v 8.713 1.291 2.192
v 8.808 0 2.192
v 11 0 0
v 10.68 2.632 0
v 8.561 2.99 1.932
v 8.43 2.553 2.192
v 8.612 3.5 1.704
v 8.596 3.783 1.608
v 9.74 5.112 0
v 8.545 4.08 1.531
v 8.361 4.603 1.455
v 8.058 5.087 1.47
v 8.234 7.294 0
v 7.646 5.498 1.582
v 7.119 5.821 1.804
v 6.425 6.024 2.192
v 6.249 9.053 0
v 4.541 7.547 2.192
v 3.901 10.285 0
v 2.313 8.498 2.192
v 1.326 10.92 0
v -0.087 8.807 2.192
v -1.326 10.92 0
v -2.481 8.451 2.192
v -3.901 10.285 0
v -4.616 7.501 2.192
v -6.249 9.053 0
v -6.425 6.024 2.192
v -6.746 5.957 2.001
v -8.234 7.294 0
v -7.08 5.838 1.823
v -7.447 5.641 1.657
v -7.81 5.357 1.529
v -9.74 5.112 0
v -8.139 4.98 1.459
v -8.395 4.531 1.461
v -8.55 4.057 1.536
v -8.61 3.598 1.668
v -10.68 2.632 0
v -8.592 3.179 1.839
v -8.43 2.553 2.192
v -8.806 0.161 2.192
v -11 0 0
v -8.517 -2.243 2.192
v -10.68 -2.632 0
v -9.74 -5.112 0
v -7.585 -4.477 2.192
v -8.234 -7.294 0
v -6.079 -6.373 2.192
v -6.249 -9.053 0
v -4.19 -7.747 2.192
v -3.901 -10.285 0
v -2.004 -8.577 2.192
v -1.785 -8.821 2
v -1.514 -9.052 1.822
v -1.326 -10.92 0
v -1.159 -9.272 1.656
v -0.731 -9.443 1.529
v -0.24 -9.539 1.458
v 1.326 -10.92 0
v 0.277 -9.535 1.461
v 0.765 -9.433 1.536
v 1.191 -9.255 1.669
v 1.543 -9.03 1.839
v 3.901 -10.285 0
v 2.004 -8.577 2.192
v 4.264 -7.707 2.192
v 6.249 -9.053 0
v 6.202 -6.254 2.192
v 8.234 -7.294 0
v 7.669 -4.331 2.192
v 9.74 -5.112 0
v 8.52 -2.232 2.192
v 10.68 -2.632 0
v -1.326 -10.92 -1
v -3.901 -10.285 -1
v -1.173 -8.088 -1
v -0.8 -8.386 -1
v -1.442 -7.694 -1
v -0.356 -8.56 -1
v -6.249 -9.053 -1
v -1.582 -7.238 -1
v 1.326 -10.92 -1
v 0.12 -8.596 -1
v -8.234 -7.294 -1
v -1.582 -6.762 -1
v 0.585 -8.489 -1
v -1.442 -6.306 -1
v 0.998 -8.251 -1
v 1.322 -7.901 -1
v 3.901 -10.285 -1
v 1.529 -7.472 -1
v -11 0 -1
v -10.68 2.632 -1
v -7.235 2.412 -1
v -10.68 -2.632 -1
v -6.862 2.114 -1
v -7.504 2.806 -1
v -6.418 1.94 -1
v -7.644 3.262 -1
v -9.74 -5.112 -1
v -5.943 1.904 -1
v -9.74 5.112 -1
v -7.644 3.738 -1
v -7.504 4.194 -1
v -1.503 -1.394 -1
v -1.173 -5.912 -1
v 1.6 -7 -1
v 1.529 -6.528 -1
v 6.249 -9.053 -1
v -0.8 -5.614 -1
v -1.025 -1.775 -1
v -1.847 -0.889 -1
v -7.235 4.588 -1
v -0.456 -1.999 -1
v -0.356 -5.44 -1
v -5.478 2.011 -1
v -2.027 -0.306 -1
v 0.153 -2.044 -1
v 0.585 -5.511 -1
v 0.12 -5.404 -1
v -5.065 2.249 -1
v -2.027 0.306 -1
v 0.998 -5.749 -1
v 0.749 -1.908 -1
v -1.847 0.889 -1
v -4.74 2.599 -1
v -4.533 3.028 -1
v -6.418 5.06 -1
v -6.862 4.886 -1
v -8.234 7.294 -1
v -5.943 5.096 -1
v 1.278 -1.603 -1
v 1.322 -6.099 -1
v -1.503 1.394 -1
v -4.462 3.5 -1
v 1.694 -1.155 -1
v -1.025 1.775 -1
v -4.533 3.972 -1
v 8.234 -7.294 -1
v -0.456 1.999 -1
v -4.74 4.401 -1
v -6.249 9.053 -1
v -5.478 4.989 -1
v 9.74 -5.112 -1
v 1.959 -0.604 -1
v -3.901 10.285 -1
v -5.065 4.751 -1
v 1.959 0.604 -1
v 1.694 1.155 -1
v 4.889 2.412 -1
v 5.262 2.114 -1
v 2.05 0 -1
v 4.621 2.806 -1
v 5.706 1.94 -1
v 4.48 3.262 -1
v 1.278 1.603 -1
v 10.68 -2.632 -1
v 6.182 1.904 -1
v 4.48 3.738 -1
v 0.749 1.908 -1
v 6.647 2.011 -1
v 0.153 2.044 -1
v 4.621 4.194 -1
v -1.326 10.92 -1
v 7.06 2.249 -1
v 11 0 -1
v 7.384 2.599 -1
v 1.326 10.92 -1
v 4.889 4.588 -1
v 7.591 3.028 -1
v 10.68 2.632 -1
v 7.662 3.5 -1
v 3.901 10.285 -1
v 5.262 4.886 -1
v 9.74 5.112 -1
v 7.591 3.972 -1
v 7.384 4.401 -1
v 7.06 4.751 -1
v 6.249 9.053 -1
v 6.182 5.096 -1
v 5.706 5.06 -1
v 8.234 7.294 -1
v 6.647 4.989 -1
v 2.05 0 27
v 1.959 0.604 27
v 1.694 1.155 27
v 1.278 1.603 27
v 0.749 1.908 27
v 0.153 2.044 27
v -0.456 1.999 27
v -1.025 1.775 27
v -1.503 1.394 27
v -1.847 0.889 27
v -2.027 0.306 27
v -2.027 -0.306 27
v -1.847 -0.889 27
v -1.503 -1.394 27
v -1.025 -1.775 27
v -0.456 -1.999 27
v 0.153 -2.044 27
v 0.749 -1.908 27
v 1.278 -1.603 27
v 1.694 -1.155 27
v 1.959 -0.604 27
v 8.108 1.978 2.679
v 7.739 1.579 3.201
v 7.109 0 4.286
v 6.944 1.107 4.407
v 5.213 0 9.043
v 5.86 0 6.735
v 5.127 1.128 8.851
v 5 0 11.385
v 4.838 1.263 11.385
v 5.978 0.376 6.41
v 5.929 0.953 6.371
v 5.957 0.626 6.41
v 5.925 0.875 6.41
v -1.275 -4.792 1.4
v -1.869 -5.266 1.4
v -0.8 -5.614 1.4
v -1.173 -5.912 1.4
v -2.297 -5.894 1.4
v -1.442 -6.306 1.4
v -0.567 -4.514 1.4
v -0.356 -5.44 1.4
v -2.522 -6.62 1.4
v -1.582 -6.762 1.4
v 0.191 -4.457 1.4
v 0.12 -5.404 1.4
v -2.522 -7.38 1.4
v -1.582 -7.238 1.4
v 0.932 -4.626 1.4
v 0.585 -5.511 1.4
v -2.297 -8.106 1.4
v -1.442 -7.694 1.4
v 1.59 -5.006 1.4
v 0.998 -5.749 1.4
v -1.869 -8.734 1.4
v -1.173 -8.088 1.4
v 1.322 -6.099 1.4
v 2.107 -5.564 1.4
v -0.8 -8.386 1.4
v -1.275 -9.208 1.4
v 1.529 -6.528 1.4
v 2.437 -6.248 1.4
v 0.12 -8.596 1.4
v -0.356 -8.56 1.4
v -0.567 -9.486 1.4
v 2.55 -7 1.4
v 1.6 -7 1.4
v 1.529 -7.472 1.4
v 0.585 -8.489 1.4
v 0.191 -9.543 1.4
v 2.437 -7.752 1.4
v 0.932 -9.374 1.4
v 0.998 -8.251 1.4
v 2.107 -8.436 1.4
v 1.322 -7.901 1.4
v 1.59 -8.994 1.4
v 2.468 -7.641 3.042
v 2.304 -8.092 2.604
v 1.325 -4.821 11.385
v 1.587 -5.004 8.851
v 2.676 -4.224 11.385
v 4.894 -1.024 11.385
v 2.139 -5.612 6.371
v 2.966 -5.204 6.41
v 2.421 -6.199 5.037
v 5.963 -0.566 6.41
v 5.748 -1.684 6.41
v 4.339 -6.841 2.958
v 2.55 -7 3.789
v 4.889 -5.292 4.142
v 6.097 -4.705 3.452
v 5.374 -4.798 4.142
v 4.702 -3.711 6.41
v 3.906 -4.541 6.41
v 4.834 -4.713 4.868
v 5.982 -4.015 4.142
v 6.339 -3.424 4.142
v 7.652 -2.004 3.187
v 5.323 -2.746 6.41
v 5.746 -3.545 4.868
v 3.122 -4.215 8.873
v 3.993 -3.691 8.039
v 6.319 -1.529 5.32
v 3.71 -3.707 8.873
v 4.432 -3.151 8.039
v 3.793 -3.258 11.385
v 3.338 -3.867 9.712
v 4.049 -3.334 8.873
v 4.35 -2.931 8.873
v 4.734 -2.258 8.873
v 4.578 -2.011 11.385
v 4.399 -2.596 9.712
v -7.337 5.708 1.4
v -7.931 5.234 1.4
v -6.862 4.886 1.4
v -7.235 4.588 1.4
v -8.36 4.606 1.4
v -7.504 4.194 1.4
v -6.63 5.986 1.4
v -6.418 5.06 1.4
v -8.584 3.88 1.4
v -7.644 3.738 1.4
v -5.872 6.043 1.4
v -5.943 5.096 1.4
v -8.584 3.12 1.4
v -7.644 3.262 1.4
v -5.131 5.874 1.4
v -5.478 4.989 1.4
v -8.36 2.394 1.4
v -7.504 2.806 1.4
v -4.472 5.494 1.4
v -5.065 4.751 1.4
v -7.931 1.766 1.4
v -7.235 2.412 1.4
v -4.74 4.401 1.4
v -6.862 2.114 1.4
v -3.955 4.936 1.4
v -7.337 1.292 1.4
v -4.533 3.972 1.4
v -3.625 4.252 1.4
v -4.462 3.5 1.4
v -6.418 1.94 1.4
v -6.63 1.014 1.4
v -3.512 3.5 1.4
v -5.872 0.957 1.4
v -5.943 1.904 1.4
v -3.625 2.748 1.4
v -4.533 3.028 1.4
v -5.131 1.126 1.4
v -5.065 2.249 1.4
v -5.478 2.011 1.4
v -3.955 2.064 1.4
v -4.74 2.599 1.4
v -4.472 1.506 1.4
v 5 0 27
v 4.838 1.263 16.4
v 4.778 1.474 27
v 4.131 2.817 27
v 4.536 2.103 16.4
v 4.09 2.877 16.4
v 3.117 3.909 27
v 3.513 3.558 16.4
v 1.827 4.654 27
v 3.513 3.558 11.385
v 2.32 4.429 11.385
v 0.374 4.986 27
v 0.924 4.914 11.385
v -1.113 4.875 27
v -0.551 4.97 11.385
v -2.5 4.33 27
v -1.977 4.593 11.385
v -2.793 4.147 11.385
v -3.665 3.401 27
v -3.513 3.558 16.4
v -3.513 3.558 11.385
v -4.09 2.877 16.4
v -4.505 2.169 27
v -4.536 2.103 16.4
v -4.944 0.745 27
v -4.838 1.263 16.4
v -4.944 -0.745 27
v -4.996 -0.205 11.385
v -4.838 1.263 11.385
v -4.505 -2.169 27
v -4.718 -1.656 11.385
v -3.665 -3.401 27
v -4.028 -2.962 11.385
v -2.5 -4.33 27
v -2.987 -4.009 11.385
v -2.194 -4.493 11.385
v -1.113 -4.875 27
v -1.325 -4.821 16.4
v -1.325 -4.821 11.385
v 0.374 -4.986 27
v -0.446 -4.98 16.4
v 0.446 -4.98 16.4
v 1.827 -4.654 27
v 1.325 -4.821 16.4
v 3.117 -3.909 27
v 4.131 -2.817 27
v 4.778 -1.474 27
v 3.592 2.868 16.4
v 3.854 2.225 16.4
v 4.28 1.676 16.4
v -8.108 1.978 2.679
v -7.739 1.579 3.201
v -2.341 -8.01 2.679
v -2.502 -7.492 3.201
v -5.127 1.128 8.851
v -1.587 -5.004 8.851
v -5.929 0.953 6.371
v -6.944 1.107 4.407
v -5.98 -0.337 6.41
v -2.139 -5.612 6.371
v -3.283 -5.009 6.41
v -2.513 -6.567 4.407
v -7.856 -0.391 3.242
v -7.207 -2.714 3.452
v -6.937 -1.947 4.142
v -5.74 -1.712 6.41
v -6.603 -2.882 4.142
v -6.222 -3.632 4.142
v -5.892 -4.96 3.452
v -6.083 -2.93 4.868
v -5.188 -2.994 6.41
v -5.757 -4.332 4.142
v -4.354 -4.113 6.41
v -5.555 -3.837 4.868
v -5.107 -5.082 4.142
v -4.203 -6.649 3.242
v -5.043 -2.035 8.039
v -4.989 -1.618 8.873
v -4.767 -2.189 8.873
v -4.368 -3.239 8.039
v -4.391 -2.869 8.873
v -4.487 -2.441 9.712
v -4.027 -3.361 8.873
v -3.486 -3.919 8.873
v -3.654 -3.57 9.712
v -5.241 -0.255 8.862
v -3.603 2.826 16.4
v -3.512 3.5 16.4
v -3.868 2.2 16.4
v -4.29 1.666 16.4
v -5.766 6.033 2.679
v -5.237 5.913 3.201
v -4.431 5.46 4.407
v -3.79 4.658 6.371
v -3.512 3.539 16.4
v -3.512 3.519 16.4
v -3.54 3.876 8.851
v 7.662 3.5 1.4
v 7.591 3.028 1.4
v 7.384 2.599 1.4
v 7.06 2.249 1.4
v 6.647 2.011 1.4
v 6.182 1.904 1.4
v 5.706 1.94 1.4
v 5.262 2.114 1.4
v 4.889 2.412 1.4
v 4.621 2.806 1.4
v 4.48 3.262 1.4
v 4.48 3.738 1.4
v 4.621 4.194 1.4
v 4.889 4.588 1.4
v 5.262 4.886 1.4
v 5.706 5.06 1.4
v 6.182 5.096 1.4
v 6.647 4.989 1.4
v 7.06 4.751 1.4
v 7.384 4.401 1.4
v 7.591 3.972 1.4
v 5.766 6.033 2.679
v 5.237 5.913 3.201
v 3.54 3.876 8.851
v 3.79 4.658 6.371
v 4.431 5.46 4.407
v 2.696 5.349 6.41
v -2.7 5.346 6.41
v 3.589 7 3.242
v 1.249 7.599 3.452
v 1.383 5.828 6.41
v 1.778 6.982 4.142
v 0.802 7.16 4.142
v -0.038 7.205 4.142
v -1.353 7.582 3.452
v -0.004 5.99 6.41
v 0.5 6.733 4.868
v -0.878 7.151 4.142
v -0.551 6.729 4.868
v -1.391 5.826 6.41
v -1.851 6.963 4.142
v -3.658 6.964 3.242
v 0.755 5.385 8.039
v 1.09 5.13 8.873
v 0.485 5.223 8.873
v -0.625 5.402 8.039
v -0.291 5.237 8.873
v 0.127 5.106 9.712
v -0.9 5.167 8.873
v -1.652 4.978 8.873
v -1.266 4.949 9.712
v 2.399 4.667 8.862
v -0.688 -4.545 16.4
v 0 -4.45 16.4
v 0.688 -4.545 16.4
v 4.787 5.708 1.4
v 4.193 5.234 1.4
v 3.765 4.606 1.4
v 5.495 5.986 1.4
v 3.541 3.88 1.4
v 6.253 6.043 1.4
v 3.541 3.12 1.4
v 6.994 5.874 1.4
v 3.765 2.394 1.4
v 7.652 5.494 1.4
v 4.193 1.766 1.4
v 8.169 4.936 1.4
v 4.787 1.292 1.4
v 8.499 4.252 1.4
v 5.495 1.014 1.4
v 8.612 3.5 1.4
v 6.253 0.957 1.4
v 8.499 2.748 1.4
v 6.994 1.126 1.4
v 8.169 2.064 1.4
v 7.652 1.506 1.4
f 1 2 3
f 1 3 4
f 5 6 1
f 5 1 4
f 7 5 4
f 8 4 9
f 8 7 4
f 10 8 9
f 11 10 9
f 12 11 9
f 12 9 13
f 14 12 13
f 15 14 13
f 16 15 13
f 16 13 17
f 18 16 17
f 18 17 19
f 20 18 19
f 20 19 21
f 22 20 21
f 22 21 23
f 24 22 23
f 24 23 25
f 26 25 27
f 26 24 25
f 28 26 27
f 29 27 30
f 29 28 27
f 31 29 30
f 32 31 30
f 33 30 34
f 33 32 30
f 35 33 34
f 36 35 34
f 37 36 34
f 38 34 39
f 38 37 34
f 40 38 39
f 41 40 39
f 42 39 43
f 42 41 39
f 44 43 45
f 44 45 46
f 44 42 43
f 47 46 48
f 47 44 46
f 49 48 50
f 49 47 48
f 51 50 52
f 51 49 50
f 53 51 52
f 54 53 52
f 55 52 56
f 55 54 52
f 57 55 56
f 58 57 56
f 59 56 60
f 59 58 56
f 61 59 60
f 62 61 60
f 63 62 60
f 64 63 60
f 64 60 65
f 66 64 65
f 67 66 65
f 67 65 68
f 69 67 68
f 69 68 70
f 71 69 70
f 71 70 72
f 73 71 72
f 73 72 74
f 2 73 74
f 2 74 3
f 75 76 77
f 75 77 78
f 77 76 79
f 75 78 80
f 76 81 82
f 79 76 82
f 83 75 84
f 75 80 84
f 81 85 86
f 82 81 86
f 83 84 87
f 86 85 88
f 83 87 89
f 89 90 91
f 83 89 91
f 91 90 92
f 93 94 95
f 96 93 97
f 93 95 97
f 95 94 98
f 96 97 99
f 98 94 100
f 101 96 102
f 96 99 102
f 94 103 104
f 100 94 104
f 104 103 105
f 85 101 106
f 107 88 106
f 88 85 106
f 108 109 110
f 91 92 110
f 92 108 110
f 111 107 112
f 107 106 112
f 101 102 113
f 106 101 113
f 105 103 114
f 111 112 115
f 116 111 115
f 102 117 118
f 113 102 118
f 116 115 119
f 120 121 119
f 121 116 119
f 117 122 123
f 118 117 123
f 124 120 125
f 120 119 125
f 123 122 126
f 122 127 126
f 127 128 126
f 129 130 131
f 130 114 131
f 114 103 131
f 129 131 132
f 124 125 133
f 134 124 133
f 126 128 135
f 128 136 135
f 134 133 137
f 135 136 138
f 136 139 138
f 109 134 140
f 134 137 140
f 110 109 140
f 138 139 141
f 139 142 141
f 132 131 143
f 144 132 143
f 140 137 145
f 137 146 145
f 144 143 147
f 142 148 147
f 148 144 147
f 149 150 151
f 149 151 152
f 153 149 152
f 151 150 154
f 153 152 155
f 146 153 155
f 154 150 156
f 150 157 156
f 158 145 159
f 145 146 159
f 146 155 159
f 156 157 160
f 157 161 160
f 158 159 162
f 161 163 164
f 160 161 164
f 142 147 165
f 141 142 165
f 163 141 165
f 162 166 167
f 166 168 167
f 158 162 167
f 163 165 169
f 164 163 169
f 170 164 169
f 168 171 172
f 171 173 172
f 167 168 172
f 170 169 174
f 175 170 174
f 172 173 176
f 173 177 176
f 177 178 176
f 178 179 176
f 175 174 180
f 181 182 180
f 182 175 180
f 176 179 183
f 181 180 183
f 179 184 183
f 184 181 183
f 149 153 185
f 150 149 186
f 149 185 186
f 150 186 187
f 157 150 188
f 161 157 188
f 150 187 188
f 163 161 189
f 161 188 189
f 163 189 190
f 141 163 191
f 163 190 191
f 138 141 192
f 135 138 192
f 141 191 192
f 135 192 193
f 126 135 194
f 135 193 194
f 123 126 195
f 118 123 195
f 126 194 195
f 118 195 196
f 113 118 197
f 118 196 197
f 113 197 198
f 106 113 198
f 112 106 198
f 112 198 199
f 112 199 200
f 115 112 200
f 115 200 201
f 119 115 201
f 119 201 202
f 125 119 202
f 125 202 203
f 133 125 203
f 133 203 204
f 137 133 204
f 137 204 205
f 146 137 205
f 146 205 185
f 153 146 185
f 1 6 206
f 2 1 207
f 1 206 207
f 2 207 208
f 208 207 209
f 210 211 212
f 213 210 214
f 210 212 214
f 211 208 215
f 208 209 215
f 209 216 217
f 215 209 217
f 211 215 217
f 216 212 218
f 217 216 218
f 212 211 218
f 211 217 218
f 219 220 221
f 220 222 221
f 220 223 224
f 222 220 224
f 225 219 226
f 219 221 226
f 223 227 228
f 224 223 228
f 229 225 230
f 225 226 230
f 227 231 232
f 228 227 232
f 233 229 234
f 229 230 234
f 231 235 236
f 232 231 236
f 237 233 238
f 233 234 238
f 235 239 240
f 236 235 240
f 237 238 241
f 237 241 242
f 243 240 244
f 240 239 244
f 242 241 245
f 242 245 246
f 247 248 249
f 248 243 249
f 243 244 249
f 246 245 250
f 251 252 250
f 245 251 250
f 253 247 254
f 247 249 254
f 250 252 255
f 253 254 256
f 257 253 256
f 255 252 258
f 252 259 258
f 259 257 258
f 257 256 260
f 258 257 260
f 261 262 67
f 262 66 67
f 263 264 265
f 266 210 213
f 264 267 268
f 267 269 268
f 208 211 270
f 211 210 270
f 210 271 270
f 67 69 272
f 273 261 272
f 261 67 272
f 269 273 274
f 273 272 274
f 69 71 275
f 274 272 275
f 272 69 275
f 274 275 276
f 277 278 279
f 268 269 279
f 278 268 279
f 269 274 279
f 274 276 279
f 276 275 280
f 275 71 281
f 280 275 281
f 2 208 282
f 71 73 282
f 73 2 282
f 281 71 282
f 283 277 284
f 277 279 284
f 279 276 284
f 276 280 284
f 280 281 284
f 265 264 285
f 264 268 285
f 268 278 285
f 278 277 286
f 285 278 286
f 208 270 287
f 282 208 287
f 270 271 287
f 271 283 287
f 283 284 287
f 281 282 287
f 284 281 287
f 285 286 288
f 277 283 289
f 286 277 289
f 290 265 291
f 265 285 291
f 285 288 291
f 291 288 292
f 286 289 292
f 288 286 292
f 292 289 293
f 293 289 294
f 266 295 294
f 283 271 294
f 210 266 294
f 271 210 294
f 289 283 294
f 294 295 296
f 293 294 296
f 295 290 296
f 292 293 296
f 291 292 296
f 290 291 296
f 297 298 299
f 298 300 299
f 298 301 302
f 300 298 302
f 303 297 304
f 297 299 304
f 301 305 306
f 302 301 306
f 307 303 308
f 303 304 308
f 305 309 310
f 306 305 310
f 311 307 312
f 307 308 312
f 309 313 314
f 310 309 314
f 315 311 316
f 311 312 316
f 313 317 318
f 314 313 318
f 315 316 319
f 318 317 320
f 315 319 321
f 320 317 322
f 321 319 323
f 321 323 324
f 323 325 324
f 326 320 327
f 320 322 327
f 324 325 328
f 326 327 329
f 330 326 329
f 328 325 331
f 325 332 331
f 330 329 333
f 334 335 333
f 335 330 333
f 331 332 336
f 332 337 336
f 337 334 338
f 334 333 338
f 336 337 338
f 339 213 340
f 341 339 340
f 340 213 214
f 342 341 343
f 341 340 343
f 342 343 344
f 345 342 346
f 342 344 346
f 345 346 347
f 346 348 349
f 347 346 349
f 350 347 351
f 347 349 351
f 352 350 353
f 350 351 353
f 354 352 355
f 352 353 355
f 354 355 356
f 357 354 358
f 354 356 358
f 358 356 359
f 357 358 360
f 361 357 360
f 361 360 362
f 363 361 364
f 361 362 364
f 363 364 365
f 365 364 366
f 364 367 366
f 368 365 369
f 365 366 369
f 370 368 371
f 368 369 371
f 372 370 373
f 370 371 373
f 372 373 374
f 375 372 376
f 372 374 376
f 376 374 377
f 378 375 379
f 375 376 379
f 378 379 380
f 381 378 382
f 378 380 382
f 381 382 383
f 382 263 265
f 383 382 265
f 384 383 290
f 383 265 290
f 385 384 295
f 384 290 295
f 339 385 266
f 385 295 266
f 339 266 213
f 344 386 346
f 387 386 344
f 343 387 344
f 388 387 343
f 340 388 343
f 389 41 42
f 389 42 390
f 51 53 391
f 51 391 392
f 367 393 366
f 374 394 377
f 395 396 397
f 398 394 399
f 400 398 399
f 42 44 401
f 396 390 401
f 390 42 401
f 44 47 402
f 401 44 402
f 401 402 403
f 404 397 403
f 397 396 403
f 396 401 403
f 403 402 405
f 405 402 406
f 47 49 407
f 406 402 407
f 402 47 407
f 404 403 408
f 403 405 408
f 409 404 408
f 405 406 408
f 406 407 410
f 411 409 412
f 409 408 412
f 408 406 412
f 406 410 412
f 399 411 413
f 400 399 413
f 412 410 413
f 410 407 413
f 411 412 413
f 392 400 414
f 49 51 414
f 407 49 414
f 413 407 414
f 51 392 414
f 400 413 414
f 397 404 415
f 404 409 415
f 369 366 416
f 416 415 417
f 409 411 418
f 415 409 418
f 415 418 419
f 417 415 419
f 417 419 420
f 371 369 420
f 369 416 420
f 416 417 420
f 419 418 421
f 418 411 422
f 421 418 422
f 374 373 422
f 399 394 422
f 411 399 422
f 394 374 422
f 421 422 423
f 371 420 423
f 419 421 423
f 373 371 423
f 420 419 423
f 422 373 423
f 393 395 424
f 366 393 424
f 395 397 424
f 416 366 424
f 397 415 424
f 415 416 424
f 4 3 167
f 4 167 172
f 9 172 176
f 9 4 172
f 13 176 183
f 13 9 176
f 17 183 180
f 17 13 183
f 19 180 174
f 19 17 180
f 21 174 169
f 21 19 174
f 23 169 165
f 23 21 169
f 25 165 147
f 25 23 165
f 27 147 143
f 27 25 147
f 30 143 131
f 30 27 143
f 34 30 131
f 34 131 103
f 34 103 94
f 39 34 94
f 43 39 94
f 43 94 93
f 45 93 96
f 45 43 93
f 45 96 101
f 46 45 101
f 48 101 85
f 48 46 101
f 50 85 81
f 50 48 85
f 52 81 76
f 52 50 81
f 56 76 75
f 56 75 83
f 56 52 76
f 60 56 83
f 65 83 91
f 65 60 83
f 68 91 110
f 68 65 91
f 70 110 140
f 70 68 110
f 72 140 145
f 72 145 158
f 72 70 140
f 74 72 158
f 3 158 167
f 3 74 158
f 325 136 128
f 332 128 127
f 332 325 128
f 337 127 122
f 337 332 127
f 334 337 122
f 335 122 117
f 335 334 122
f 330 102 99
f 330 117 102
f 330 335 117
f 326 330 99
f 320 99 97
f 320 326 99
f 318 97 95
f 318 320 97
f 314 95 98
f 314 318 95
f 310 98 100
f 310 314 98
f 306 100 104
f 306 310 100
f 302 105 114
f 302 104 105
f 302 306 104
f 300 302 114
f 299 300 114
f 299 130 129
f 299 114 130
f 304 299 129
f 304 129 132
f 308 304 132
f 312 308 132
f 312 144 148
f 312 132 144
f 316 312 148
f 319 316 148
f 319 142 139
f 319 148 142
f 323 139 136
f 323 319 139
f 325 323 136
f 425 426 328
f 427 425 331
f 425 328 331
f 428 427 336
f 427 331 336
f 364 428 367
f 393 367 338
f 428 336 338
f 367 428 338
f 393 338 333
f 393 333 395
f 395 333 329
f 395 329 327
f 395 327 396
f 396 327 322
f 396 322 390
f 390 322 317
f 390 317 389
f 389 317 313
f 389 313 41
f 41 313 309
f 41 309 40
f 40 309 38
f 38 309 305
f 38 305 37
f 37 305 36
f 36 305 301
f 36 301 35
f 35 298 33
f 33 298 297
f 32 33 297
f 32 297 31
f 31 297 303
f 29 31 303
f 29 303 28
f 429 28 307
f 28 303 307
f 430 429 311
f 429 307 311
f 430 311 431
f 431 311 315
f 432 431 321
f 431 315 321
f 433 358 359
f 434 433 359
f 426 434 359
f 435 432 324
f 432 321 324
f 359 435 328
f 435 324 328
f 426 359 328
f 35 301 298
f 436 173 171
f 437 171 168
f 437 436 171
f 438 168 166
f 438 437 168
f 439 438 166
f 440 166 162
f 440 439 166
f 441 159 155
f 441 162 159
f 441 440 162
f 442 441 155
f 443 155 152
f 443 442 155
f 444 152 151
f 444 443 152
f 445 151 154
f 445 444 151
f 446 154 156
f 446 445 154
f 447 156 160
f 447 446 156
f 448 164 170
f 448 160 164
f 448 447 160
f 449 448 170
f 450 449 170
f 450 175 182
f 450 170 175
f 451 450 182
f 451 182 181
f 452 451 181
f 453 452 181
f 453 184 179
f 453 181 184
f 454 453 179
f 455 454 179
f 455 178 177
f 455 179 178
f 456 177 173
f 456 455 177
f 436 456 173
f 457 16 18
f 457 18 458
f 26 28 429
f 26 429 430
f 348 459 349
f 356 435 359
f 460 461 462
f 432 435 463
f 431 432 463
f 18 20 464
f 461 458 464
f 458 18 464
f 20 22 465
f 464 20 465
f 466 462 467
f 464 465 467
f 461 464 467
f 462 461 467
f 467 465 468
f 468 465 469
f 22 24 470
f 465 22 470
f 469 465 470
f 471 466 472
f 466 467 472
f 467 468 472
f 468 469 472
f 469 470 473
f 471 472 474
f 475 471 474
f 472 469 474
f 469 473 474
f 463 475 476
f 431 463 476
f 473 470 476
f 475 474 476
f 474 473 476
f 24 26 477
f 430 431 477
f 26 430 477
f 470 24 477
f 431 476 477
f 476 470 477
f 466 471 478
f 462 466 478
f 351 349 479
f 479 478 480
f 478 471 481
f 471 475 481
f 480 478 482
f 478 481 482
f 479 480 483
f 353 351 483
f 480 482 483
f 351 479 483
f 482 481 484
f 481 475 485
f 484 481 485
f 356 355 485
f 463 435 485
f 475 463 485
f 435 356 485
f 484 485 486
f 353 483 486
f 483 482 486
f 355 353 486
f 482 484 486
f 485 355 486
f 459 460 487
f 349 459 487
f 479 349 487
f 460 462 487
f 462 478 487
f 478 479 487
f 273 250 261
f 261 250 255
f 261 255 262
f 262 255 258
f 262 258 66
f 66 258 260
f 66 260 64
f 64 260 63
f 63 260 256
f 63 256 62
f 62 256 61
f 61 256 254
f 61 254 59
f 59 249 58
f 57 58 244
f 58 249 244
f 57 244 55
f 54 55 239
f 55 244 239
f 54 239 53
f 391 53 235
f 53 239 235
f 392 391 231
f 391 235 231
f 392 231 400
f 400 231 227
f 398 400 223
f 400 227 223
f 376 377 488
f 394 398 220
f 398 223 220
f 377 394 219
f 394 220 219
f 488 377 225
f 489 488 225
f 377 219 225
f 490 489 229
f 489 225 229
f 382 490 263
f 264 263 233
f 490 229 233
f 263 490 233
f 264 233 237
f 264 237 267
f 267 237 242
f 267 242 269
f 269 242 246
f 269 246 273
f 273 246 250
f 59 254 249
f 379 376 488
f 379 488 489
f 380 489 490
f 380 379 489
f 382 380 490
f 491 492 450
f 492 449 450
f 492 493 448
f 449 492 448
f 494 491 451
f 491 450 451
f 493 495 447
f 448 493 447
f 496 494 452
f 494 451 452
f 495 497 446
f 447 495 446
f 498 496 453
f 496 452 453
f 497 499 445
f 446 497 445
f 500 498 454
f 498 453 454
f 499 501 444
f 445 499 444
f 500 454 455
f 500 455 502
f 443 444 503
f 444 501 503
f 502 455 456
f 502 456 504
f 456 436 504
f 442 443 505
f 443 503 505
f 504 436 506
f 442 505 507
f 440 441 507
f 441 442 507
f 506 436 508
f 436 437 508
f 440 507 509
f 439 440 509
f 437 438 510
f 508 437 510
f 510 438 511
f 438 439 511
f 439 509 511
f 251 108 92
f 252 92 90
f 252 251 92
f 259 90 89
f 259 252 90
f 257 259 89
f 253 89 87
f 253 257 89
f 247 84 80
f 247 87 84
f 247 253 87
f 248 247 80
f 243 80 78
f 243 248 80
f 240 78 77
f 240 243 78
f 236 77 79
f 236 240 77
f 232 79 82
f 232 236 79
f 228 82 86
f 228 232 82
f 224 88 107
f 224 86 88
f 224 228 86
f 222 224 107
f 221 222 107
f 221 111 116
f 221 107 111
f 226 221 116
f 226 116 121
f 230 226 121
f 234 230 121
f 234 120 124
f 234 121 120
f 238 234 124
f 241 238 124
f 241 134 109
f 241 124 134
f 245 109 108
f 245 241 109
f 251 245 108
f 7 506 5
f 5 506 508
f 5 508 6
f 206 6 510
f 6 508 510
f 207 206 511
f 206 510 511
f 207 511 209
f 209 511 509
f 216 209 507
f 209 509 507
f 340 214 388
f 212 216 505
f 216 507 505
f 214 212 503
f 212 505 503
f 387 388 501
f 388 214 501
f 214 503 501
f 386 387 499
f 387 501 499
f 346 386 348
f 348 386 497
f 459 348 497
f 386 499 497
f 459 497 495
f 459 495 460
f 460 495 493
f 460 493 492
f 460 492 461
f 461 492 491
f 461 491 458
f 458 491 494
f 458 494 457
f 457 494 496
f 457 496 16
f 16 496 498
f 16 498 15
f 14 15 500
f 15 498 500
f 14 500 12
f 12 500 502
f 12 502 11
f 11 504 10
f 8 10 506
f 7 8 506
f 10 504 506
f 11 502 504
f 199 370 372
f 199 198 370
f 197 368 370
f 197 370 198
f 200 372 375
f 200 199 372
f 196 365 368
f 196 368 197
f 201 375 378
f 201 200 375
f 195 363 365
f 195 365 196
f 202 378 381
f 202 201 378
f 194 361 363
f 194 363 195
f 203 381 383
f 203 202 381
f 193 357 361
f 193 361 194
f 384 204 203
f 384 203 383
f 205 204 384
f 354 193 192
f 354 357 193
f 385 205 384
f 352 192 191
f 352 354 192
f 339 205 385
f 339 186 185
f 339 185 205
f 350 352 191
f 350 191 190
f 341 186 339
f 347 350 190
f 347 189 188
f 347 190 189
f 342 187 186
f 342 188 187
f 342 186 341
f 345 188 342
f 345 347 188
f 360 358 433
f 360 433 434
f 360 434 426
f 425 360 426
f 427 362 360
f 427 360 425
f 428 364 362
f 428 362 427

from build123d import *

# Parameters (mm, degrees)
F0_R        = 13
F1_DEPTH    = 6
F2_R        = 5
F3_DEPTH    = 21
F4_S5_R     = 5
F4_T6_DEPTH = 20
F5_R        = 13
F6_DEPTH    = 1
F8_R        = 1.6
F9_DEPTH    = 25
F10_R       = 2.55
F11_DEPTH   = 15
F12_R       = 2.05
F13_DEPTH   = 30


# Not quite as in the source:
# - a fillet or chamfer that OpenCascade refuses, or shapes differently, is made with other operations: its cross-section is extruded or revolved along the edge and cut away or added


with BuildPart() as f1:
    # F0 (on Top) → F1 (new body)
    with BuildSketch(Plane.XY):
        Circle(F0_R)
    extrude(amount=F1_DEPTH)

    # F2 (on face) → F3 (join)
    with BuildSketch(Plane.XY.offset(6)):
        Circle(F2_R)
    extrude(amount=F3_DEPTH)

    # F4: chamfer of 8 on 1 edges, made by hand


with BuildPart() as f4_tool2:
    # F4_s3 → F4_t4 (revolve)
    with BuildSketch(Plane.XZ):
        Polygon((13, -2), (5, 6), (13, 6), align=None)
    revolve(axis=Axis((0, 0, 6), (0, 0, 1)))

    # F4_s5 → F4_t6 (cut, symmetric)
    with BuildSketch(Plane.XY.offset(2)):
        Circle(F4_S5_R)
    extrude(amount=F4_T6_DEPTH, both=True, mode=Mode.SUBTRACT)


with BuildPart() as f1_1:
    add(f1.part)

    # F4_t1: cut F4_tool2
    add(f4_tool2.part, mode=Mode.SUBTRACT)

    # F5
    f5_edges = [f1_1.edges().sort_by_distance(p)[0] for p in [
        (-5, 0, 6),
    ]]
    fillet(f5_edges, radius=F5_R)

    # F6 (add): a face of the model
    f6_faces = [f1_1.faces().sort_by_distance(p)[0] for p in [
        (0, 0, 0),
    ]]
    extrude(f6_faces, amount=F6_DEPTH)

    # F8 (on offset) → F9 (cut)
    with BuildSketch(Plane(origin=(0, 0, 1.4), x_dir=(1, 0, 0), z_dir=(0, 0, -1))):
        with Locations((6.0621778265, -3.5)):
            Circle(F8_R)
        with Locations((0, 7)):
            Circle(F8_R)
        with Locations((-6.0621778265, -3.5)):
            Circle(F8_R)
    extrude(amount=F9_DEPTH, mode=Mode.SUBTRACT)

    # F10 (on offset) → F11 (cut)
    with BuildSketch(Plane(origin=(0, 0, 1.4), x_dir=(1, 0, 0), z_dir=(0, 0, -1))):
        with Locations((0, 7)):
            Circle(F10_R)
        with Locations((6.0621778265, -3.5)):
            Circle(F10_R)
        with Locations((-6.0621778265, -3.5)):
            Circle(F10_R)
    extrude(amount=-F11_DEPTH, mode=Mode.SUBTRACT)

    # F12 (on face) → F13 (cut)
    with BuildSketch(Plane.XY.offset(27)):
        Circle(F12_R)
    extrude(amount=-F13_DEPTH, mode=Mode.SUBTRACT)


solid = f1_1.part
